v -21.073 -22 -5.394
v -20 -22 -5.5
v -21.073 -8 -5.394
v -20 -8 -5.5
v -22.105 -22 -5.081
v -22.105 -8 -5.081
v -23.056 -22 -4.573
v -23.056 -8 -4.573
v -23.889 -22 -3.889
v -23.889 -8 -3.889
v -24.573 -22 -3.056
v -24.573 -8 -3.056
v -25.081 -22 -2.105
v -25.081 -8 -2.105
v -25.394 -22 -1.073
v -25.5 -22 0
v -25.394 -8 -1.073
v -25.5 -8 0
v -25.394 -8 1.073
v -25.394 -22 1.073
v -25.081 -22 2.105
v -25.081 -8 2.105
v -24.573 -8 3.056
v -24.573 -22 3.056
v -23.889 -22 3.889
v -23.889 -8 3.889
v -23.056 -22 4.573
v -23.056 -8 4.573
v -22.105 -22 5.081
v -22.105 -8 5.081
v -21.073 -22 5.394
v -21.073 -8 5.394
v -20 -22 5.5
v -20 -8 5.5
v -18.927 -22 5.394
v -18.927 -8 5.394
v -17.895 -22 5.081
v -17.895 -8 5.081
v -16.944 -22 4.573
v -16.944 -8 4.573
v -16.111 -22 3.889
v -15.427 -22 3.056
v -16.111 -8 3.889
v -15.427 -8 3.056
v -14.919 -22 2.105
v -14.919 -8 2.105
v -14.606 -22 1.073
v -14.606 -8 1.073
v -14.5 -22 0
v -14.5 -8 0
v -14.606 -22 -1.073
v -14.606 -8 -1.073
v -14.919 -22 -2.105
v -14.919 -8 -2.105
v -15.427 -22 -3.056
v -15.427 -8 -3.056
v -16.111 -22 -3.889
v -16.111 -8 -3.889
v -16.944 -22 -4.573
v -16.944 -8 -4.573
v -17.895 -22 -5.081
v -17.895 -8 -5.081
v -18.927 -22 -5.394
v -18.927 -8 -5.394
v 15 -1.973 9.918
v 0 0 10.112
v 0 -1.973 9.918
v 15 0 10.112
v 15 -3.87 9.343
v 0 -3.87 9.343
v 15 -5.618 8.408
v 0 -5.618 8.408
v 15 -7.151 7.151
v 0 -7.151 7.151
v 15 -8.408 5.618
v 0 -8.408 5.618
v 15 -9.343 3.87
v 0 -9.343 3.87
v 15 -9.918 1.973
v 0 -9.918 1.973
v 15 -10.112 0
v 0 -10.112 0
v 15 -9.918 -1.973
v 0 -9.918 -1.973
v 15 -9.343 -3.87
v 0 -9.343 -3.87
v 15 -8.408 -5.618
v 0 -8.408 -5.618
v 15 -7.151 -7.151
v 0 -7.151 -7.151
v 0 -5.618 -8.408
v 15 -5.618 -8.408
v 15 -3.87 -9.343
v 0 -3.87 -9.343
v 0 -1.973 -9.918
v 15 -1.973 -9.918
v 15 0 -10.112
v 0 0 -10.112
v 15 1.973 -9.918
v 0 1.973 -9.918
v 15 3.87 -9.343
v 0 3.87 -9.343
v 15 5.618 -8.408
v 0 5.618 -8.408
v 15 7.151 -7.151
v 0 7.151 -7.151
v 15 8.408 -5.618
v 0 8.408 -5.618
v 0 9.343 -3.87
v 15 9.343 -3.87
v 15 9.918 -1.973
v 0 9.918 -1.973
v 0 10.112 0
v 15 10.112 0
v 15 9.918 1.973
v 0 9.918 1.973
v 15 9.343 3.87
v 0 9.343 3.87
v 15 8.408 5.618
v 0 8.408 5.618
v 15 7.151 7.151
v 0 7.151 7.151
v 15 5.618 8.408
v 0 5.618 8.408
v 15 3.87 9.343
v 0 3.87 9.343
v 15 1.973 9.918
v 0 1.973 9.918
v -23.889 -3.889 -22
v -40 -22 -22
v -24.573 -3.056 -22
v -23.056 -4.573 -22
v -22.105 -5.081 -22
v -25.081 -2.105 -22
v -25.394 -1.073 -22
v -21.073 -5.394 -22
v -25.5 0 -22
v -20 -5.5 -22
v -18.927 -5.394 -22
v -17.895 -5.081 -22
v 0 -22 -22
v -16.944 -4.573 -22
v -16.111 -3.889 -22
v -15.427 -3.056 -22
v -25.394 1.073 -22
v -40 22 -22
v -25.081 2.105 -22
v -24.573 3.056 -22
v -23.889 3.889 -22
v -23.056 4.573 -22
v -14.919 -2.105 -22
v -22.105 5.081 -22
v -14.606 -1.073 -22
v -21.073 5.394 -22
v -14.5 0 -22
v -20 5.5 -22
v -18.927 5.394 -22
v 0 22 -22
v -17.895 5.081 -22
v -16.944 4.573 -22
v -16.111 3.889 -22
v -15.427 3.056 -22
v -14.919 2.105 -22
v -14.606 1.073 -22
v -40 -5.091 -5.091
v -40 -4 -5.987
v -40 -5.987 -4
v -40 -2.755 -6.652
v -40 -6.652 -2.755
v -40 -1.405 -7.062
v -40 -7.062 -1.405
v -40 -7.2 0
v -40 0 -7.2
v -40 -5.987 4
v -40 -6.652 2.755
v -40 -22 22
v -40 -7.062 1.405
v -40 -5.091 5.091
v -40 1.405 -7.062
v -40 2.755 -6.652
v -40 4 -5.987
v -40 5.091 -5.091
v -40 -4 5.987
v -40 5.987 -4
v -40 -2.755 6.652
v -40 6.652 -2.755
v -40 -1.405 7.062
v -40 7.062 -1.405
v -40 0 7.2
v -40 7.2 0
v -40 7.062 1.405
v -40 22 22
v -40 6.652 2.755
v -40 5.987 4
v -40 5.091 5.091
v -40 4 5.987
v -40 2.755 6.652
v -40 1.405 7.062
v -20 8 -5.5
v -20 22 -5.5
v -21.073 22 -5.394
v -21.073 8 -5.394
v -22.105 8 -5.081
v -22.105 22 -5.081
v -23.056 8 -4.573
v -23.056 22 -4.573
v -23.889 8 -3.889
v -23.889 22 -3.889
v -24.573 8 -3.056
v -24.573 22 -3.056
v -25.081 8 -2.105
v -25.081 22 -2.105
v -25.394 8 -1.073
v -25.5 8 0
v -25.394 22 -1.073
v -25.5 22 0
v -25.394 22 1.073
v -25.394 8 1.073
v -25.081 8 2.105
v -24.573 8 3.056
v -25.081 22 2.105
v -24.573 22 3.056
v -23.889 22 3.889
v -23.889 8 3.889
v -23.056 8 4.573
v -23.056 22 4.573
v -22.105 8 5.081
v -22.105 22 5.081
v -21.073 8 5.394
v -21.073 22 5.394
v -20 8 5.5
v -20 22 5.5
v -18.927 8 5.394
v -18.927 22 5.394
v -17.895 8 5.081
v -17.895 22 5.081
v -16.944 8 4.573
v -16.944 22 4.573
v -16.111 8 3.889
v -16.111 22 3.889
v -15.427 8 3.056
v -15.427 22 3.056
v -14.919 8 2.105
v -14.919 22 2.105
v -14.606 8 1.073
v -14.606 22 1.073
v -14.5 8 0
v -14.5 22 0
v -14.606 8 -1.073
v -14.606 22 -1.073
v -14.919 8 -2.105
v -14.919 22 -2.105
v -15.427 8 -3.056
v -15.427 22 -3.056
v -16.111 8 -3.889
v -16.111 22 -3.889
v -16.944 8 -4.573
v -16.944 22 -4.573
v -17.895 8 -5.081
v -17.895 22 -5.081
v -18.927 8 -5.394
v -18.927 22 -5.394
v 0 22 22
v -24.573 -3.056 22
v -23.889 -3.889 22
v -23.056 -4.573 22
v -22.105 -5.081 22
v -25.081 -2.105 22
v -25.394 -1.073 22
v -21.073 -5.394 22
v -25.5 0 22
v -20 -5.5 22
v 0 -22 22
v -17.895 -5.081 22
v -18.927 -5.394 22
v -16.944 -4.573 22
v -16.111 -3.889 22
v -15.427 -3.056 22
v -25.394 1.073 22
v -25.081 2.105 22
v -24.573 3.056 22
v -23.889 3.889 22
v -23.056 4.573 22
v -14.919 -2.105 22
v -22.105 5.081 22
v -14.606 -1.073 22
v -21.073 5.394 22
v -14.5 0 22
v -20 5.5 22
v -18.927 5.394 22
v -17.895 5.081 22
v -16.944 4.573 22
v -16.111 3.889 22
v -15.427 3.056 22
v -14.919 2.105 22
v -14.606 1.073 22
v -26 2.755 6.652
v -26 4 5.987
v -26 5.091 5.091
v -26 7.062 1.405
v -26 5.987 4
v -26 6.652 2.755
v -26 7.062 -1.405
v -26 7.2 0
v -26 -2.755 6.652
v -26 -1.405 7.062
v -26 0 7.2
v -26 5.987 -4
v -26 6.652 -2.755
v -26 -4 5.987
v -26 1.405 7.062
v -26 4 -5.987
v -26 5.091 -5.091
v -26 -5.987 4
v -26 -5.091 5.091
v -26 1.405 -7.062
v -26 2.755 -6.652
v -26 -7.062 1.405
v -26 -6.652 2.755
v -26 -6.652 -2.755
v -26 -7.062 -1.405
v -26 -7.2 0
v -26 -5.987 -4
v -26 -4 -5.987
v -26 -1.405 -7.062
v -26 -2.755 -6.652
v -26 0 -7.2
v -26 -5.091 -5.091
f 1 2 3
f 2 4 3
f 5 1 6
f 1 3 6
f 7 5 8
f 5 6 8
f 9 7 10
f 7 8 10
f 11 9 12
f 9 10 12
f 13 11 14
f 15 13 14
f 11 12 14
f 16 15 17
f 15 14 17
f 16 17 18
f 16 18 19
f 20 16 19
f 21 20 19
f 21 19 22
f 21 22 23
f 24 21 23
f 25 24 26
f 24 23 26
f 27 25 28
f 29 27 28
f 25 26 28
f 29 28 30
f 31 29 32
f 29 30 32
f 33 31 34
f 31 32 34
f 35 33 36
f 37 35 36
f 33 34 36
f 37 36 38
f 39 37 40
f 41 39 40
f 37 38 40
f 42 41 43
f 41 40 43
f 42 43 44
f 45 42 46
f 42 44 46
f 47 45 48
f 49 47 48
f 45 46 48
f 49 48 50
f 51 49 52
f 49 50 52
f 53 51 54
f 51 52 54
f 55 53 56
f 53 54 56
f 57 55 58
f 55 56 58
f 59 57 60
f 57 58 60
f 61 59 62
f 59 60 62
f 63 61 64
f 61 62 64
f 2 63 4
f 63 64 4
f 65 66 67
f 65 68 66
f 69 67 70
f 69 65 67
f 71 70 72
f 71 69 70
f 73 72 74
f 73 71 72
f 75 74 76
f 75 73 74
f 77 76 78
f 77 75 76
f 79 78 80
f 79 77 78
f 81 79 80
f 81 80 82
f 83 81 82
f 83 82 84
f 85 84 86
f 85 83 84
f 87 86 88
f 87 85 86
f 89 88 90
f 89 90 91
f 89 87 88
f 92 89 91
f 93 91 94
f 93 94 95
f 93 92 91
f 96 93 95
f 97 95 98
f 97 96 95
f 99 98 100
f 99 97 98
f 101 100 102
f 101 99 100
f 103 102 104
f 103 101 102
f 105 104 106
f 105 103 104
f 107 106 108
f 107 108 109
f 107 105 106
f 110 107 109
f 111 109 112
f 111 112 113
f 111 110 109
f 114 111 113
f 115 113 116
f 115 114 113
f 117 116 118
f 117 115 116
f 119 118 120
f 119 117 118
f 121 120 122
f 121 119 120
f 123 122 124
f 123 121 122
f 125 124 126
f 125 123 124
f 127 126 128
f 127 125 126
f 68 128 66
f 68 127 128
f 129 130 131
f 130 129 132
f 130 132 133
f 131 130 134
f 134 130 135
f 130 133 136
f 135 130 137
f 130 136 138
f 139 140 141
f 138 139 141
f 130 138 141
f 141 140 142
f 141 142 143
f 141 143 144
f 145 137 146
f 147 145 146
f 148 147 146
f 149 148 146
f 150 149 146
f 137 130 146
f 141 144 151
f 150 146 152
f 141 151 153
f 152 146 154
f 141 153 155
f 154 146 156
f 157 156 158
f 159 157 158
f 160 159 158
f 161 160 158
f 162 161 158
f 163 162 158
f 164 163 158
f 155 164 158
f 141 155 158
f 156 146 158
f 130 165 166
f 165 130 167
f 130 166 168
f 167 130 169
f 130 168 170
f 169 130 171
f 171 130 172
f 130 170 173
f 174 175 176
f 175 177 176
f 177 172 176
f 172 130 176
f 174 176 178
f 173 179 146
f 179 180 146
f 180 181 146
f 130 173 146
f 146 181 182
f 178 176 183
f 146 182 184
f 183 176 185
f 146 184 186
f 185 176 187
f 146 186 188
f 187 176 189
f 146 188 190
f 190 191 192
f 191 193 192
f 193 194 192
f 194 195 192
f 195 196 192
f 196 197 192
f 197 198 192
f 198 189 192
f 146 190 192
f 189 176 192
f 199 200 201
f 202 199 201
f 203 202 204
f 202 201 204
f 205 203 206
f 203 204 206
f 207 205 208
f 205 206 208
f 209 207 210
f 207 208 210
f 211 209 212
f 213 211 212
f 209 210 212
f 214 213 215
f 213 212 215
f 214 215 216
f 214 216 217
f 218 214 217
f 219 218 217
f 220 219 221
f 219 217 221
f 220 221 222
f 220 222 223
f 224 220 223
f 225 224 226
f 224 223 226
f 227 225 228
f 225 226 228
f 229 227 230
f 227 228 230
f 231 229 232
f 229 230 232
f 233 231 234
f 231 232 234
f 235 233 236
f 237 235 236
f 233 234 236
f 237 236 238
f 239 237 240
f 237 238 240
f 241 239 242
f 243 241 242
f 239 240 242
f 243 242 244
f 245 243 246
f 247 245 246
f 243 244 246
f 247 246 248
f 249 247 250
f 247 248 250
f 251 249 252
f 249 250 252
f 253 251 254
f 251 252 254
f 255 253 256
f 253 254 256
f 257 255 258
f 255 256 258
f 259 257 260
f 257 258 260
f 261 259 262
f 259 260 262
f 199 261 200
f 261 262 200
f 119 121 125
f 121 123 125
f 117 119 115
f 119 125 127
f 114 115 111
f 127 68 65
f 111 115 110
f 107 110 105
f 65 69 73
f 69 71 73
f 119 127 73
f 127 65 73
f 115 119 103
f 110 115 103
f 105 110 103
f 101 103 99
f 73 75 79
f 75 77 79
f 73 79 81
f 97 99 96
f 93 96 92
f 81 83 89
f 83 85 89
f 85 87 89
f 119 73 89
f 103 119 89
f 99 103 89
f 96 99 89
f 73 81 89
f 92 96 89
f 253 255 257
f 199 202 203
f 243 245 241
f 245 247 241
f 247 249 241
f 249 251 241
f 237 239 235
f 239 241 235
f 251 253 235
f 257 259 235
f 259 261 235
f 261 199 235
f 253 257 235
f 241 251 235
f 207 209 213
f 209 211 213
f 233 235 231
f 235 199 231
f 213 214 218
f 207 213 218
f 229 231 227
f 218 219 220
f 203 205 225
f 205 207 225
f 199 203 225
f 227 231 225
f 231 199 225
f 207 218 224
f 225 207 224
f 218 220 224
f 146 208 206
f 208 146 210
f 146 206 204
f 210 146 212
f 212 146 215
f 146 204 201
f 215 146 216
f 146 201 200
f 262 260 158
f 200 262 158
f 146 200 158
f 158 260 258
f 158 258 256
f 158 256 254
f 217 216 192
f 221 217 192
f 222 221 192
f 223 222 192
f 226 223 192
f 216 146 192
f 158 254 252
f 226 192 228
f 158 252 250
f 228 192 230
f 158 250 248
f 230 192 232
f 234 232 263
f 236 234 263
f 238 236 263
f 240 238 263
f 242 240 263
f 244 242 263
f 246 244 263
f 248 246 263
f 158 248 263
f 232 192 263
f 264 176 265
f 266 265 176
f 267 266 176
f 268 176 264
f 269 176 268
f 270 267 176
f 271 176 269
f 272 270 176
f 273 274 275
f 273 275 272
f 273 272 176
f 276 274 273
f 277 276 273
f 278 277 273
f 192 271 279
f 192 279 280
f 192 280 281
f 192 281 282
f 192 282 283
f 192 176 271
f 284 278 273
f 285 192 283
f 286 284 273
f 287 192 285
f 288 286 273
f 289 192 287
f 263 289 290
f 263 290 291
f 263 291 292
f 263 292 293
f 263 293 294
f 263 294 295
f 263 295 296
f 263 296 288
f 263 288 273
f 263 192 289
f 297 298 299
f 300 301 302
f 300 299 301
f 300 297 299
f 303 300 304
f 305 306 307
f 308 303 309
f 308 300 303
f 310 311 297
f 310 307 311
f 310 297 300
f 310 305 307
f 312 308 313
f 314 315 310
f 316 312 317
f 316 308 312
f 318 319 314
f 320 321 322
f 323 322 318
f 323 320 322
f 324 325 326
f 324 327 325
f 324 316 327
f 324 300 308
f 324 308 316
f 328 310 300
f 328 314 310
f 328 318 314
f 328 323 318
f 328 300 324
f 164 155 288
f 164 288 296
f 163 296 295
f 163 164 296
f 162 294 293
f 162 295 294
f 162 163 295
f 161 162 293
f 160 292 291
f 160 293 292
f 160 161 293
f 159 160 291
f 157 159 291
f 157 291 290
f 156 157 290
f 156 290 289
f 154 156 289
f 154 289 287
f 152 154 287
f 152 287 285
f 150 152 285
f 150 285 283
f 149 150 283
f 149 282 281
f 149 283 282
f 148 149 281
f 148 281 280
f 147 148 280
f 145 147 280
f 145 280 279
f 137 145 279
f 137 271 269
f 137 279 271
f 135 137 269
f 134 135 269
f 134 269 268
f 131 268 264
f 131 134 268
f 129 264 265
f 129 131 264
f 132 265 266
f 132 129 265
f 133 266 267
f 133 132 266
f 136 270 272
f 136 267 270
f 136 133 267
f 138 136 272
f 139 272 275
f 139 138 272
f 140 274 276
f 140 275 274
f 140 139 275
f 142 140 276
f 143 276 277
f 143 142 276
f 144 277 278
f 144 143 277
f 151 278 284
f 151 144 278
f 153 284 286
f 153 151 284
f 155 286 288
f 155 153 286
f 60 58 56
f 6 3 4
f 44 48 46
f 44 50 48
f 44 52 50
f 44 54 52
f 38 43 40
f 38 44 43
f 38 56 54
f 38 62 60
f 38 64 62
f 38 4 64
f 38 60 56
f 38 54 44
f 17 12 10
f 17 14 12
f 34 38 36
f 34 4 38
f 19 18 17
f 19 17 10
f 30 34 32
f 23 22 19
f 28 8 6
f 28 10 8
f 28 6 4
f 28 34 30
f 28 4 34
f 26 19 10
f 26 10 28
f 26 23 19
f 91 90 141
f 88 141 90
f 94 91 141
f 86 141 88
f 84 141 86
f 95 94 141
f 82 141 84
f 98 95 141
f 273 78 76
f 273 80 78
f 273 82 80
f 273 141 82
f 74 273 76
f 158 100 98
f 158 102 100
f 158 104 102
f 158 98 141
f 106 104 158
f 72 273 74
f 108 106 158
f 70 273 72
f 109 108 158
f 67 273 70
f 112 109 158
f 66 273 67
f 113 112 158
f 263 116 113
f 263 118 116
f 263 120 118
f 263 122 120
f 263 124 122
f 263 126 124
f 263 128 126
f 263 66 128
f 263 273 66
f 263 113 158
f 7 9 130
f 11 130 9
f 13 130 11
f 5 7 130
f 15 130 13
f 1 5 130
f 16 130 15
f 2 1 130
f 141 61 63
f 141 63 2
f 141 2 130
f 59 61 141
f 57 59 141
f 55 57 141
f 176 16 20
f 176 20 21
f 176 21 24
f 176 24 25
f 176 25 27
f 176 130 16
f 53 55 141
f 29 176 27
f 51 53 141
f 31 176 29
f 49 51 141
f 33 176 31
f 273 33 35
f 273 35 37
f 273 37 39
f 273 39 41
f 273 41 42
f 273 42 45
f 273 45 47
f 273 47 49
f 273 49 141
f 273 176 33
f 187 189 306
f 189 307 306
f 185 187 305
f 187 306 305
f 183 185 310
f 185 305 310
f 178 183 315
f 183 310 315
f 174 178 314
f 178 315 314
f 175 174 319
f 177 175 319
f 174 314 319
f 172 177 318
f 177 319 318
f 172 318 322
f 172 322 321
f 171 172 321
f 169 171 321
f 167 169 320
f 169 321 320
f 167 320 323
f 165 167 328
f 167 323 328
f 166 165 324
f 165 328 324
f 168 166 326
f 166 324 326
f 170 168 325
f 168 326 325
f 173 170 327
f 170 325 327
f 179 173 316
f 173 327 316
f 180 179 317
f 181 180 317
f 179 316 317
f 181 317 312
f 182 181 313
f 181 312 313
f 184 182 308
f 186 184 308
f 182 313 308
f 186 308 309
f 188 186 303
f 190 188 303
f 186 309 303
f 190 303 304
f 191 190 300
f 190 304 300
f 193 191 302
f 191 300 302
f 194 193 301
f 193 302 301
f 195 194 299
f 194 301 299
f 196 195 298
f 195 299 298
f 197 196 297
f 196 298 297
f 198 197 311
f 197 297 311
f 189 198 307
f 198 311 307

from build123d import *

# Parameters (mm, degrees)
BLOCK_SKETCH_W          = 40
BLOCK_SKETCH_H          = 44
BLOCK_DEPTH             = 22
NECK_SKETCH_W           = 15
NECK_SKETCH_H           = 10.1125
REGULATOR_PORT_SKETCH_W = 15
REGULATOR_PORT_SKETCH_H = 7.2
SIDE_PORT_Y_SKETCH_W    = 5.5
SIDE_PORT_Y_SKETCH_H    = 15
SIDE_PORT_Y_SKETCH_2_W  = 5.5
SIDE_PORT_Y_SKETCH_2_H  = 15
SIDE_PORT_Z_SKETCH_R    = 5.5
SIDE_PORT_Z_DEPTH       = 23
SIDE_START              = -23
SIDE_PORT_Z_SKETCH_2_R  = 5.5
SIDE_PORT_Z_2_DEPTH     = 23


with BuildPart() as part:
    # Block Sketch → Block (new, symmetric)
    with BuildSketch(Plane.XY):
        with Locations((-20, 0)):
            Rectangle(BLOCK_SKETCH_W, BLOCK_SKETCH_H)
    extrude(amount=BLOCK_DEPTH, both=True)

    # Neck Sketch → Neck (revolve)
    with BuildSketch(Plane.XY):
        with Locations((7.5, 5.05625)):
            Rectangle(NECK_SKETCH_W, NECK_SKETCH_H)
    revolve(axis=Axis((-1000, 0, 0), (1, 0, 0)))

    # Regulator Port Sketch → Regulator Port (revolve, cut)
    with BuildSketch(Plane.XY):
        with Locations((-33.5, 3.6)):
            Rectangle(REGULATOR_PORT_SKETCH_W, REGULATOR_PORT_SKETCH_H)
    revolve(axis=Axis((-1000, 0, 0), (1, 0, 0)), mode=Mode.SUBTRACT)

    # Side Port _Y Sketch → Side Port _Y (revolve, cut)
    with BuildSketch(Plane.XY):
        with Locations((-17.25, 15.5)):
            Rectangle(SIDE_PORT_Y_SKETCH_W, SIDE_PORT_Y_SKETCH_H)
    revolve(axis=Axis((-20, -40, 0), (0, 1, 0)), mode=Mode.SUBTRACT)

    # Side Port -Y Sketch 2 → Side Port -Y 2 (revolve, cut)
    with BuildSketch(Plane.XY):
        with Locations((-17.25, -15.5)):
            Rectangle(SIDE_PORT_Y_SKETCH_2_W, SIDE_PORT_Y_SKETCH_2_H)
    revolve(axis=Axis((-20, -40, 0), (0, 1, 0)), mode=Mode.SUBTRACT)

    # Side Port _Z Sketch → Side Port _Z (cut)
    with BuildSketch(Plane.XY):
        with Locations((-20, 0)):
            Circle(SIDE_PORT_Z_SKETCH_R)
    extrude(amount=SIDE_PORT_Z_DEPTH, mode=Mode.SUBTRACT)

    # Side Port -Z Sketch 2 → Side Port -Z 2 (cut)
    with BuildSketch(Plane.XY.offset(SIDE_START)):
        with Locations((-20, 0)):
            Circle(SIDE_PORT_Z_SKETCH_2_R)
    extrude(amount=SIDE_PORT_Z_2_DEPTH, mode=Mode.SUBTRACT)


solid = part.part
